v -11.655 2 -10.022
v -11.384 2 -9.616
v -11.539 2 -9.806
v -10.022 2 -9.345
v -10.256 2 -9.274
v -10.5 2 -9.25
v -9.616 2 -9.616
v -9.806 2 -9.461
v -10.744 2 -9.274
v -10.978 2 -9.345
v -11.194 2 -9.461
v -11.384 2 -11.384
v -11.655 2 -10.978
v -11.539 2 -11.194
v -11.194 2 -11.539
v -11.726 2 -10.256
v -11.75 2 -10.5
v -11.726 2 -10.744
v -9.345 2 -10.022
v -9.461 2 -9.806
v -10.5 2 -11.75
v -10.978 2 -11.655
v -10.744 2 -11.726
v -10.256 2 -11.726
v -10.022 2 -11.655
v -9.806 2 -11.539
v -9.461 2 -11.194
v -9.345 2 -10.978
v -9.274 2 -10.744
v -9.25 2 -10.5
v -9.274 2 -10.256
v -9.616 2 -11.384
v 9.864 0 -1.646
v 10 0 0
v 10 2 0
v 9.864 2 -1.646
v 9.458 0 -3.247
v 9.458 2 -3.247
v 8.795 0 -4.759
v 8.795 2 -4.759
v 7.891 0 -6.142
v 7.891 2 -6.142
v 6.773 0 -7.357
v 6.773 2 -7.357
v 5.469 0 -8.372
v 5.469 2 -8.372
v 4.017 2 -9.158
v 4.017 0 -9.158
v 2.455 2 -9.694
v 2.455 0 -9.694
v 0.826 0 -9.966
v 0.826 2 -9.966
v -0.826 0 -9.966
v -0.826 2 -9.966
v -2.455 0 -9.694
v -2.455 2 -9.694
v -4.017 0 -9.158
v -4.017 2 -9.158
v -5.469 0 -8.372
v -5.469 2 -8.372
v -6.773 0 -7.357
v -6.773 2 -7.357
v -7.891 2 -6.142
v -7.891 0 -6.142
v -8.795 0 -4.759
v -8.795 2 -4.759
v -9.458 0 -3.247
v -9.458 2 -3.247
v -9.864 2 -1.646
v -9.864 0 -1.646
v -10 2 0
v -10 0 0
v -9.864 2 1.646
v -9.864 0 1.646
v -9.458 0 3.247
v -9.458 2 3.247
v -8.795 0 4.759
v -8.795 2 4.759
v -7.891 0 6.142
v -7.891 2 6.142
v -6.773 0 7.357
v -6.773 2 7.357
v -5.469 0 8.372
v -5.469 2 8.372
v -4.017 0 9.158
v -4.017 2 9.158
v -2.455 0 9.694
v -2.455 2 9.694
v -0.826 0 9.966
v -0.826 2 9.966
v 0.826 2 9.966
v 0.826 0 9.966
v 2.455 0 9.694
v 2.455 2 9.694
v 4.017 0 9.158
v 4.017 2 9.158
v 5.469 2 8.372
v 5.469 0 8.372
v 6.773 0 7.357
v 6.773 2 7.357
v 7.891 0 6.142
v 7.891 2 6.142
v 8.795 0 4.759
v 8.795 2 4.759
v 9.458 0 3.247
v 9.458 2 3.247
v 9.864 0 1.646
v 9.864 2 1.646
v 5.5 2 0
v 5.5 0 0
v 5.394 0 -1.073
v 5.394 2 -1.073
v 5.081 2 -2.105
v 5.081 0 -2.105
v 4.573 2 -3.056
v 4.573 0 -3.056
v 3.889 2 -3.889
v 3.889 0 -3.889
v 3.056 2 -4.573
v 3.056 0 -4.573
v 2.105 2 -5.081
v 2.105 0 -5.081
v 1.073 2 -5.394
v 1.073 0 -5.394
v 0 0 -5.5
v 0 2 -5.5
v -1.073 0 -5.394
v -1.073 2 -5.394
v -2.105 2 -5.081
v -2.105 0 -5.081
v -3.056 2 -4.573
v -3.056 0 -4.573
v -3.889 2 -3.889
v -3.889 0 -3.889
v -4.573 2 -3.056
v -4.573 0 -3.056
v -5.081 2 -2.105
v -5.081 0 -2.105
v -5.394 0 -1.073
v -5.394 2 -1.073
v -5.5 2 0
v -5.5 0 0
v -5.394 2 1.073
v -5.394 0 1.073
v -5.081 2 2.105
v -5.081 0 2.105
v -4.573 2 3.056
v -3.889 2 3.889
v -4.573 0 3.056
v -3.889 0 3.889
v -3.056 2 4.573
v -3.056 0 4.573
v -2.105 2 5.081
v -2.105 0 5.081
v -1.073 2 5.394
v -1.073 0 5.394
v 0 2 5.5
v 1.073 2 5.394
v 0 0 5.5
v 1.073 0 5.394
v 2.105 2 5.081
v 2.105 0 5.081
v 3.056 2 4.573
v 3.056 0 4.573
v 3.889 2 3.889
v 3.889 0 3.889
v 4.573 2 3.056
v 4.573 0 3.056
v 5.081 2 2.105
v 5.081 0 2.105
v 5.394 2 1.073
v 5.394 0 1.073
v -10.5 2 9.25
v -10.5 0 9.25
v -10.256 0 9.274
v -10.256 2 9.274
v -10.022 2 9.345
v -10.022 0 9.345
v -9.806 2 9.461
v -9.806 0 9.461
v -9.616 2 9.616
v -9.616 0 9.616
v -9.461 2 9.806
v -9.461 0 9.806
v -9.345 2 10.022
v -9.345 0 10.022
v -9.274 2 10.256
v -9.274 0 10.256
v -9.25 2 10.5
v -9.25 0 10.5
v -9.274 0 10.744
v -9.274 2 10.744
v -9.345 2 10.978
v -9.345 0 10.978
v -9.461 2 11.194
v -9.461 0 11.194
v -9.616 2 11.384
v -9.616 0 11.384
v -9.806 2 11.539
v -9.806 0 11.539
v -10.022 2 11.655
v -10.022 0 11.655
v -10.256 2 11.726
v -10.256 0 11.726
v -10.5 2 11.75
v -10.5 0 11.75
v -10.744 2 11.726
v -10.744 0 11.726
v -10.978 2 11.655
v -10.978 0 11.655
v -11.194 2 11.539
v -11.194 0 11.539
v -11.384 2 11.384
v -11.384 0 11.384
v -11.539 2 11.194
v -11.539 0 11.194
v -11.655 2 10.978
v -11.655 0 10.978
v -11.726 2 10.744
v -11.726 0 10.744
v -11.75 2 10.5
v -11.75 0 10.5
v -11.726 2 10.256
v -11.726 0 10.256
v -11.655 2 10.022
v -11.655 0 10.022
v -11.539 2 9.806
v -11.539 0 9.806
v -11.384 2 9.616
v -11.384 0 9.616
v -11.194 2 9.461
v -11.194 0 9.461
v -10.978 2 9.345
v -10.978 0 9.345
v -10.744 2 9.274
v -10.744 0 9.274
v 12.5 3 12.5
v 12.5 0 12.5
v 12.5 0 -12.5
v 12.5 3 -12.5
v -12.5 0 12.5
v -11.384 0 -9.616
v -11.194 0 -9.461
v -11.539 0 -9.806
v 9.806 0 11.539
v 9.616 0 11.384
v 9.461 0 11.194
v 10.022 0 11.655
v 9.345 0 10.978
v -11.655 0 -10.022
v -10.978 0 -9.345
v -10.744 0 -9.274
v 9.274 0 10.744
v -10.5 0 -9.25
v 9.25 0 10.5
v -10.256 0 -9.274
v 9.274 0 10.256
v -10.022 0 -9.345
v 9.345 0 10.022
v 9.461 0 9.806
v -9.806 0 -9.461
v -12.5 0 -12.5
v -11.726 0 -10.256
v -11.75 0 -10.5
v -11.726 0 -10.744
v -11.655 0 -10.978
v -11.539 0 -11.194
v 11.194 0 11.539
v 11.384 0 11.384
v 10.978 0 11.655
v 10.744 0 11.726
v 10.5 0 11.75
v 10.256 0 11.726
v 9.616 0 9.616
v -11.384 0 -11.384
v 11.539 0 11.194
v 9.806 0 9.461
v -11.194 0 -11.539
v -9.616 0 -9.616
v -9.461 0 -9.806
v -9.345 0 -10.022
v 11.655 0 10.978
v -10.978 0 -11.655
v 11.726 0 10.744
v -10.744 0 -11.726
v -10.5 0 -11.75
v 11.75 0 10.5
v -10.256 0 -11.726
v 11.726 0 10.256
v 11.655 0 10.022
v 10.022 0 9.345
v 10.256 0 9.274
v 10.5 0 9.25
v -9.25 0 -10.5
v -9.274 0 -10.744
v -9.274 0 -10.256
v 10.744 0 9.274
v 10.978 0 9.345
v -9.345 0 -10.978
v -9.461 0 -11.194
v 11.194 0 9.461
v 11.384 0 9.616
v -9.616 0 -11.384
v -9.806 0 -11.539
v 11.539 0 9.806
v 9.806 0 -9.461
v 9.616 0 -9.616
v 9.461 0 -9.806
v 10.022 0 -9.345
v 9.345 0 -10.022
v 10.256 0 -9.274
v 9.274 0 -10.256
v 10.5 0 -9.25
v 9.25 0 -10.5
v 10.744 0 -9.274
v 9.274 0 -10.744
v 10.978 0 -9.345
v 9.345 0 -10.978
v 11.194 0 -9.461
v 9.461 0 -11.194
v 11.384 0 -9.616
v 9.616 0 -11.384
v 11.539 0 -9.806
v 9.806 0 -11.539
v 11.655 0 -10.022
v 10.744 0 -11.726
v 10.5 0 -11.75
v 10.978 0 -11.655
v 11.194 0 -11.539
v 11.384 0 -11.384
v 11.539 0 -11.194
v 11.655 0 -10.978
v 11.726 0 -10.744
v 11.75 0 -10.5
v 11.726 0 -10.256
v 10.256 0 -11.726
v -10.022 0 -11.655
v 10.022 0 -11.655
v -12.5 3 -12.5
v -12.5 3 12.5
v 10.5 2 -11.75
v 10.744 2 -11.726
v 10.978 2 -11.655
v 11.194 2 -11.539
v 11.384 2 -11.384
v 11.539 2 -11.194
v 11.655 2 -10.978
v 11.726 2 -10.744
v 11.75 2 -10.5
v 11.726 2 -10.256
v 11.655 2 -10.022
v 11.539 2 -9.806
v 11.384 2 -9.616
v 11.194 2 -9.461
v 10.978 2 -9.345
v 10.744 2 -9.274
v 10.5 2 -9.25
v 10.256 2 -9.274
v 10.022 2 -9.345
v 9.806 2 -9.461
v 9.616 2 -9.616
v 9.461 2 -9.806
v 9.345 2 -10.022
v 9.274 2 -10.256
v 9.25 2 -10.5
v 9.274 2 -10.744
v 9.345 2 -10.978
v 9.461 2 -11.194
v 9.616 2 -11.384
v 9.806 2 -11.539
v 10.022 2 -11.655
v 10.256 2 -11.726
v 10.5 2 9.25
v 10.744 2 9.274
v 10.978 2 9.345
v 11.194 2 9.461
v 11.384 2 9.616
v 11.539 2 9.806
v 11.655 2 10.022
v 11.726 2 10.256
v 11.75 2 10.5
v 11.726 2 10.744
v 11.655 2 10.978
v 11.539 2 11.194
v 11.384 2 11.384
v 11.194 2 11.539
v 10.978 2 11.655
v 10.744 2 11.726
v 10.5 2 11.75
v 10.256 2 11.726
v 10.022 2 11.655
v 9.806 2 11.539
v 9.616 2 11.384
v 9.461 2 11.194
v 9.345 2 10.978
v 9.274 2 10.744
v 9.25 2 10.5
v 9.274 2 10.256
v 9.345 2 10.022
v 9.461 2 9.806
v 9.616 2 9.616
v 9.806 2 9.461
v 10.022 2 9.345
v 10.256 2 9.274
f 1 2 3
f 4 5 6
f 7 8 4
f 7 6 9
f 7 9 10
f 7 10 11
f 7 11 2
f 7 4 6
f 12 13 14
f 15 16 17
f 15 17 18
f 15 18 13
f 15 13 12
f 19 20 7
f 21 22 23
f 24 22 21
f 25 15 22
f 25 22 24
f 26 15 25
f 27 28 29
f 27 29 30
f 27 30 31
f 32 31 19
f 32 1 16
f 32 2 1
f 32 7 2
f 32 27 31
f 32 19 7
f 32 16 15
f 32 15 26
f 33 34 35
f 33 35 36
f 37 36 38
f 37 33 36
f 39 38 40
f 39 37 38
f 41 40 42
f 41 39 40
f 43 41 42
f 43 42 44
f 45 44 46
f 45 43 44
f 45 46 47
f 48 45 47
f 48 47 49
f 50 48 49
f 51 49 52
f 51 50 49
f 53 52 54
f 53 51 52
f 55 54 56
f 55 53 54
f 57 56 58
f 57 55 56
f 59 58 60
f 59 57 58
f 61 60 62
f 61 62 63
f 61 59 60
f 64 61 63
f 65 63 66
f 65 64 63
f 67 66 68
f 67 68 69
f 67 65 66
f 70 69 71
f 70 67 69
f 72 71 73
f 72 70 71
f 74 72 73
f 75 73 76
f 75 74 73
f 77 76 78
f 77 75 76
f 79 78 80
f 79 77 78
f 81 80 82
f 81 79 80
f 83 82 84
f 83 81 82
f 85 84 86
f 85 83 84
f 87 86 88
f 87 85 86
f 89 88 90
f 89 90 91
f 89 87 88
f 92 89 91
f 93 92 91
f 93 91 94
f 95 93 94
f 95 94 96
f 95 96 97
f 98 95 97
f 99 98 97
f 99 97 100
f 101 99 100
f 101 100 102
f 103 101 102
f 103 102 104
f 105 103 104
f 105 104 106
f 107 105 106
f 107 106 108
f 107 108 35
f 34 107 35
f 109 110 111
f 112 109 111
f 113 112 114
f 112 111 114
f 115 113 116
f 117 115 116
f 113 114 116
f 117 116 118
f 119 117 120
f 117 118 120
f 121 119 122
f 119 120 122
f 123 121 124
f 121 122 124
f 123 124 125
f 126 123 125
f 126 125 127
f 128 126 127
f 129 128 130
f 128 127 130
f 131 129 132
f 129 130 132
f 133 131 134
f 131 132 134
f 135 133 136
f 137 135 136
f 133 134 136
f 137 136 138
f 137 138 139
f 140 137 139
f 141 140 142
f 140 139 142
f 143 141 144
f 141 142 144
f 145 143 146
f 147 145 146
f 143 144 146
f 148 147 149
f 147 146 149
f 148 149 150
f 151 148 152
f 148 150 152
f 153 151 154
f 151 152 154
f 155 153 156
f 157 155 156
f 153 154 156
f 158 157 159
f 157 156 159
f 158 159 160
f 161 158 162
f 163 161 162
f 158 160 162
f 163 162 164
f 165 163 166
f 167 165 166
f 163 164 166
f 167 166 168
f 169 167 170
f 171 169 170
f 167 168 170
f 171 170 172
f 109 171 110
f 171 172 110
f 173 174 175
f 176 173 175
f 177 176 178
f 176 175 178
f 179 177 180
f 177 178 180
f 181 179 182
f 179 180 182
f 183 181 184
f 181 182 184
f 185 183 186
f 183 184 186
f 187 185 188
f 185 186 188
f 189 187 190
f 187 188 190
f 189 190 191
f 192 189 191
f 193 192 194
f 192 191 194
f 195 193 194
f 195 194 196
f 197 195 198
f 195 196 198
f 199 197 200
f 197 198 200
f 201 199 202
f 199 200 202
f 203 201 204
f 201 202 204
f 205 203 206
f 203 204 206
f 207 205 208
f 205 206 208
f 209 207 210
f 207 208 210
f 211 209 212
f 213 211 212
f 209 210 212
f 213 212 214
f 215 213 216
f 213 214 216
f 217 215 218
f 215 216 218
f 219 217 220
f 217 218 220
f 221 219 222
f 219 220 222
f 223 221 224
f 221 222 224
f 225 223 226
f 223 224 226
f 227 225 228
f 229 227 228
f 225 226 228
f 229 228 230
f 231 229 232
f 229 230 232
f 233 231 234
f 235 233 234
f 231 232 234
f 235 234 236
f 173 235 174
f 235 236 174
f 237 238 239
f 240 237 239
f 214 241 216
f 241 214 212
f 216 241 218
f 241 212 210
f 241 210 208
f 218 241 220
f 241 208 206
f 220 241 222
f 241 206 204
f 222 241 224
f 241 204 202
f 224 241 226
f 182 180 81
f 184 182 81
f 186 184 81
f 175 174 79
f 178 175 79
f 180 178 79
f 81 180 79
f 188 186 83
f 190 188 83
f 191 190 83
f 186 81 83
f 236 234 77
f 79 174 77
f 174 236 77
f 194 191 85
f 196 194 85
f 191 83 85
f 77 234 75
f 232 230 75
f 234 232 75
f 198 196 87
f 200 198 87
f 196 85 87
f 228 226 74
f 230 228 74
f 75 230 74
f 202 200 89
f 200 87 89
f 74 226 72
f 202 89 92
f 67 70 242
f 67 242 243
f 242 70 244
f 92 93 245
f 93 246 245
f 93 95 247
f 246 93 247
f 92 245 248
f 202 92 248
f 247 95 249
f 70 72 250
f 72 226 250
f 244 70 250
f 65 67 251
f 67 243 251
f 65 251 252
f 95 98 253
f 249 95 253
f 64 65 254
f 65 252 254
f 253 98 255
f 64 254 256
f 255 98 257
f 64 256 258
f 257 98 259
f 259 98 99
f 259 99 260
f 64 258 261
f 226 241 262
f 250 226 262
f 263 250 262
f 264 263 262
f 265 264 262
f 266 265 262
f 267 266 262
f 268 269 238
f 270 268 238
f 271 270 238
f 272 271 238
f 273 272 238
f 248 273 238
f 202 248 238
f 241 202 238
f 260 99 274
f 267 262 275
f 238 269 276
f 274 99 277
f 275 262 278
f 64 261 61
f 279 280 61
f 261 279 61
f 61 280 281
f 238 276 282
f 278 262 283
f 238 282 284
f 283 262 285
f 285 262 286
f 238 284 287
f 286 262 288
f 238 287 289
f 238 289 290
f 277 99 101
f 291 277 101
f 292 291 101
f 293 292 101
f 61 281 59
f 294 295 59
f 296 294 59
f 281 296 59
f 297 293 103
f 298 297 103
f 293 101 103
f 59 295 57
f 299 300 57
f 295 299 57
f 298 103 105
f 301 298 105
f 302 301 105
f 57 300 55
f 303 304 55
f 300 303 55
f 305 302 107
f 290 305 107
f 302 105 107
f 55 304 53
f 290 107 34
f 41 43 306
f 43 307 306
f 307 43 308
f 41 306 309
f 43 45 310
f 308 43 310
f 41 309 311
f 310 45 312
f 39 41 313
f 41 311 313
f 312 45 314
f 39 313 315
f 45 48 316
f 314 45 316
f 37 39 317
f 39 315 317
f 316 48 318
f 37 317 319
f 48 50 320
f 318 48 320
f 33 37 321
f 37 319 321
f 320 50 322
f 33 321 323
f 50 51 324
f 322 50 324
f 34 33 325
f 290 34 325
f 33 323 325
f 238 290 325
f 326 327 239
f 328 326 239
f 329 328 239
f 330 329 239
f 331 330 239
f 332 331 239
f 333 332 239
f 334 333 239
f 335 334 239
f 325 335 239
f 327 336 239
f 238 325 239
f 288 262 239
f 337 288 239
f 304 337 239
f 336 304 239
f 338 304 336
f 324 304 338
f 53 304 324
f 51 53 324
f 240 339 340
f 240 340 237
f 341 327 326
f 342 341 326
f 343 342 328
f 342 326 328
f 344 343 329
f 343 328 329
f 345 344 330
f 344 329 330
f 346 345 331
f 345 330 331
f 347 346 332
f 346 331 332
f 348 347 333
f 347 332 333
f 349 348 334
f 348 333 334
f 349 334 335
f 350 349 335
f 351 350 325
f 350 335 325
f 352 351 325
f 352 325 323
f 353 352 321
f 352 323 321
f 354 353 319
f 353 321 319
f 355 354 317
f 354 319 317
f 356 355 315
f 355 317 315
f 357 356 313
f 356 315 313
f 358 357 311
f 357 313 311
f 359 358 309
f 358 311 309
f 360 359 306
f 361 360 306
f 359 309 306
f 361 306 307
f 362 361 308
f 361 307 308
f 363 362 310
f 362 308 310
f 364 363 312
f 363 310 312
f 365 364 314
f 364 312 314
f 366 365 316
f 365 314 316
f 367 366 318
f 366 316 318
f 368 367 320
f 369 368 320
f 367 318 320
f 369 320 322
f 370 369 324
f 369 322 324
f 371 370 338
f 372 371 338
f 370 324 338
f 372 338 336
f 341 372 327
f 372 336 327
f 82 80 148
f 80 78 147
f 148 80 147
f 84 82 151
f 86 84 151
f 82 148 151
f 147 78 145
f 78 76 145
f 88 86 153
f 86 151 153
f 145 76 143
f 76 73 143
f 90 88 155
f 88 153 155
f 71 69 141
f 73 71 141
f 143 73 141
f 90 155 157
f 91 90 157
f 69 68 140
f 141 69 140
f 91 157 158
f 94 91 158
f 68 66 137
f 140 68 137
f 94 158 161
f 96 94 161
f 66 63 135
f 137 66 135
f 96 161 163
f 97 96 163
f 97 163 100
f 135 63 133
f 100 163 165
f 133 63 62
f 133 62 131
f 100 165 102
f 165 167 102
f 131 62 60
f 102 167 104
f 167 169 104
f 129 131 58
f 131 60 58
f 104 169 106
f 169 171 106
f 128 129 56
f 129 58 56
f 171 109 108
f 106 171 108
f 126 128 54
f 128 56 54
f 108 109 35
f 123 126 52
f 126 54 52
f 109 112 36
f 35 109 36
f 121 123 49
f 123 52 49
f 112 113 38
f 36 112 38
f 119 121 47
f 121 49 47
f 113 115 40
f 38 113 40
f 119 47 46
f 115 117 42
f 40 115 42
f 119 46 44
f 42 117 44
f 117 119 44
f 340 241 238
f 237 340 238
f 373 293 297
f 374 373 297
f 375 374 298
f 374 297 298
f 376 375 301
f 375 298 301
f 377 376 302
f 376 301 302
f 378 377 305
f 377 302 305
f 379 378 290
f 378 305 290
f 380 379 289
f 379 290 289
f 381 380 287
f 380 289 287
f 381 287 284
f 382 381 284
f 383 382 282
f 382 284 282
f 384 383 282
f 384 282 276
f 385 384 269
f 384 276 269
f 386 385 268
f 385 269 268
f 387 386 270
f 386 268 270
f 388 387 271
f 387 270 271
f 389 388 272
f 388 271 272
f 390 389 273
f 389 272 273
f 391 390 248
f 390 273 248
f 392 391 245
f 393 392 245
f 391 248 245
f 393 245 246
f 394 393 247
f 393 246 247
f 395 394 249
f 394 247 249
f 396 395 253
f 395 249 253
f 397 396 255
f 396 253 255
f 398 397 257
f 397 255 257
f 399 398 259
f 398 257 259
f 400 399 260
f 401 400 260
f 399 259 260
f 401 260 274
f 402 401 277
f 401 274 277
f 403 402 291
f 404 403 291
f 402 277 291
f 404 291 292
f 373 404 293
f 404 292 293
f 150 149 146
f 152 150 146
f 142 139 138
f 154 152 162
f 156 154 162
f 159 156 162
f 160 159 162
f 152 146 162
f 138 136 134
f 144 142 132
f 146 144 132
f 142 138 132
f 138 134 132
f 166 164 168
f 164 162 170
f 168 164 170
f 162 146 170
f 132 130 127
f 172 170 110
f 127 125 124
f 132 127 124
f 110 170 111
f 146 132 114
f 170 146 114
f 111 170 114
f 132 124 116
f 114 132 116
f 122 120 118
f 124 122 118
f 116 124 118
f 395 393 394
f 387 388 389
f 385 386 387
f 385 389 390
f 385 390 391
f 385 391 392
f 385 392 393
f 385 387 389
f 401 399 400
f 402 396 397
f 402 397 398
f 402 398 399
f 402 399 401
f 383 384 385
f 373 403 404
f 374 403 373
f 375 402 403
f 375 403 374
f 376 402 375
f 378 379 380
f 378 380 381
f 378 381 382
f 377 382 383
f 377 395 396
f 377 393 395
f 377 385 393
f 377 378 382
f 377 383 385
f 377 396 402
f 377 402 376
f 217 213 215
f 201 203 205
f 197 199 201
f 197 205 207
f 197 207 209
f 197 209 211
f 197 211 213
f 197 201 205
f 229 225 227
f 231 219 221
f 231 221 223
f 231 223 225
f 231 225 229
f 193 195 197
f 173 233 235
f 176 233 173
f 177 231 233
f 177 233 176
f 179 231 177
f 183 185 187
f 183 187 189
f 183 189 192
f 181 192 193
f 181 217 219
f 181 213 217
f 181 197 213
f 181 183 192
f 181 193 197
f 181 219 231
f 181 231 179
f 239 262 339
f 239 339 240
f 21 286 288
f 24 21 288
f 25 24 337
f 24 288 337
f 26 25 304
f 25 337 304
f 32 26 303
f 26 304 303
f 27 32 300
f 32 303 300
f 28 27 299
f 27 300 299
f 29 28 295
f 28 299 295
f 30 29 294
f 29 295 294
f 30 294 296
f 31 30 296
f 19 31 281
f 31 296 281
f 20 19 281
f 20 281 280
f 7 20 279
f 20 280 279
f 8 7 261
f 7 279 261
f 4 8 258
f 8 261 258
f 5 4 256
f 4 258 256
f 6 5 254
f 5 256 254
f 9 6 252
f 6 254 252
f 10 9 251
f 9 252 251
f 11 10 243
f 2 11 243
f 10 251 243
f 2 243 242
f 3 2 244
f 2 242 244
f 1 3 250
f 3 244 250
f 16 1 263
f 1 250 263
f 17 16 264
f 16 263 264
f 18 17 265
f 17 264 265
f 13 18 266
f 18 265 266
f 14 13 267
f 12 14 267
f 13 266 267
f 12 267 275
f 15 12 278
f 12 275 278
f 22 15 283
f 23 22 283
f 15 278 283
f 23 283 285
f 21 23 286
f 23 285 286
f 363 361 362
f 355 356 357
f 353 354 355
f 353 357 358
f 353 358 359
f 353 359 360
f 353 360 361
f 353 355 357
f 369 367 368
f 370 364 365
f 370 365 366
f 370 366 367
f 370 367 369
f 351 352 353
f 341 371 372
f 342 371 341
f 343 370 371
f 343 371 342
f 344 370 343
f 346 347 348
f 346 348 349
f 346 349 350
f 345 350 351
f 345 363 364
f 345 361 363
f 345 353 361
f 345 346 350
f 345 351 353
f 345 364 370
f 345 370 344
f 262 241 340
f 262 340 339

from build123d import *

# Parameters (mm, degrees)
SKETCH1_W           = 25
SKETCH1_H           = 25
BOSS_EXTRUDE1_DEPTH = 3
CAVITY1_OUTLINE_R   = 10
CAVITY1_OUTLINE_R_2 = 5.5
CAVITY1_DEPTH       = 2
SKETCH2_R           = 1.25
CUT_EXTRUDE1_DEPTH  = 2


# Read off the part's stored shape, not the designer's step: Cavity1
with BuildPart() as part:
    # Sketch1 → Boss-Extrude1 (new body)
    with BuildSketch(Plane(origin=(0, 0, 0), x_dir=(1, 0, 0), z_dir=(0, 1, 0))):
        Rectangle(SKETCH1_W, SKETCH1_H)
    extrude(amount=BOSS_EXTRUDE1_DEPTH)

    # Cavity1 outline → Cavity1 (cut)
    with BuildSketch(Plane(origin=(0, 0, 0), x_dir=(1, 0, 0), z_dir=(0, 1, 0))):
        Circle(CAVITY1_OUTLINE_R)
        Circle(CAVITY1_OUTLINE_R_2, mode=Mode.SUBTRACT)
    extrude(amount=CAVITY1_DEPTH, mode=Mode.SUBTRACT)

    # Sketch2 → Cut-Extrude1 (cut)
    with BuildSketch(Plane.XZ):
        with Locations(Location((-10.5, 10.5, 0), (0, 0, 270))):
            Circle(SKETCH2_R)
        with Locations(Location((10.5, 10.5, 0), (0, 0, 270))):
            Circle(SKETCH2_R)
        with Locations(Location((10.5, -10.5, 0), (0, 0, 270))):
            Circle(SKETCH2_R)
        with Locations(Location((-10.5, -10.5, 0), (0, 0, 270))):
            Circle(SKETCH2_R)
    extrude(amount=-CUT_EXTRUDE1_DEPTH, mode=Mode.SUBTRACT)


solid = part.part
